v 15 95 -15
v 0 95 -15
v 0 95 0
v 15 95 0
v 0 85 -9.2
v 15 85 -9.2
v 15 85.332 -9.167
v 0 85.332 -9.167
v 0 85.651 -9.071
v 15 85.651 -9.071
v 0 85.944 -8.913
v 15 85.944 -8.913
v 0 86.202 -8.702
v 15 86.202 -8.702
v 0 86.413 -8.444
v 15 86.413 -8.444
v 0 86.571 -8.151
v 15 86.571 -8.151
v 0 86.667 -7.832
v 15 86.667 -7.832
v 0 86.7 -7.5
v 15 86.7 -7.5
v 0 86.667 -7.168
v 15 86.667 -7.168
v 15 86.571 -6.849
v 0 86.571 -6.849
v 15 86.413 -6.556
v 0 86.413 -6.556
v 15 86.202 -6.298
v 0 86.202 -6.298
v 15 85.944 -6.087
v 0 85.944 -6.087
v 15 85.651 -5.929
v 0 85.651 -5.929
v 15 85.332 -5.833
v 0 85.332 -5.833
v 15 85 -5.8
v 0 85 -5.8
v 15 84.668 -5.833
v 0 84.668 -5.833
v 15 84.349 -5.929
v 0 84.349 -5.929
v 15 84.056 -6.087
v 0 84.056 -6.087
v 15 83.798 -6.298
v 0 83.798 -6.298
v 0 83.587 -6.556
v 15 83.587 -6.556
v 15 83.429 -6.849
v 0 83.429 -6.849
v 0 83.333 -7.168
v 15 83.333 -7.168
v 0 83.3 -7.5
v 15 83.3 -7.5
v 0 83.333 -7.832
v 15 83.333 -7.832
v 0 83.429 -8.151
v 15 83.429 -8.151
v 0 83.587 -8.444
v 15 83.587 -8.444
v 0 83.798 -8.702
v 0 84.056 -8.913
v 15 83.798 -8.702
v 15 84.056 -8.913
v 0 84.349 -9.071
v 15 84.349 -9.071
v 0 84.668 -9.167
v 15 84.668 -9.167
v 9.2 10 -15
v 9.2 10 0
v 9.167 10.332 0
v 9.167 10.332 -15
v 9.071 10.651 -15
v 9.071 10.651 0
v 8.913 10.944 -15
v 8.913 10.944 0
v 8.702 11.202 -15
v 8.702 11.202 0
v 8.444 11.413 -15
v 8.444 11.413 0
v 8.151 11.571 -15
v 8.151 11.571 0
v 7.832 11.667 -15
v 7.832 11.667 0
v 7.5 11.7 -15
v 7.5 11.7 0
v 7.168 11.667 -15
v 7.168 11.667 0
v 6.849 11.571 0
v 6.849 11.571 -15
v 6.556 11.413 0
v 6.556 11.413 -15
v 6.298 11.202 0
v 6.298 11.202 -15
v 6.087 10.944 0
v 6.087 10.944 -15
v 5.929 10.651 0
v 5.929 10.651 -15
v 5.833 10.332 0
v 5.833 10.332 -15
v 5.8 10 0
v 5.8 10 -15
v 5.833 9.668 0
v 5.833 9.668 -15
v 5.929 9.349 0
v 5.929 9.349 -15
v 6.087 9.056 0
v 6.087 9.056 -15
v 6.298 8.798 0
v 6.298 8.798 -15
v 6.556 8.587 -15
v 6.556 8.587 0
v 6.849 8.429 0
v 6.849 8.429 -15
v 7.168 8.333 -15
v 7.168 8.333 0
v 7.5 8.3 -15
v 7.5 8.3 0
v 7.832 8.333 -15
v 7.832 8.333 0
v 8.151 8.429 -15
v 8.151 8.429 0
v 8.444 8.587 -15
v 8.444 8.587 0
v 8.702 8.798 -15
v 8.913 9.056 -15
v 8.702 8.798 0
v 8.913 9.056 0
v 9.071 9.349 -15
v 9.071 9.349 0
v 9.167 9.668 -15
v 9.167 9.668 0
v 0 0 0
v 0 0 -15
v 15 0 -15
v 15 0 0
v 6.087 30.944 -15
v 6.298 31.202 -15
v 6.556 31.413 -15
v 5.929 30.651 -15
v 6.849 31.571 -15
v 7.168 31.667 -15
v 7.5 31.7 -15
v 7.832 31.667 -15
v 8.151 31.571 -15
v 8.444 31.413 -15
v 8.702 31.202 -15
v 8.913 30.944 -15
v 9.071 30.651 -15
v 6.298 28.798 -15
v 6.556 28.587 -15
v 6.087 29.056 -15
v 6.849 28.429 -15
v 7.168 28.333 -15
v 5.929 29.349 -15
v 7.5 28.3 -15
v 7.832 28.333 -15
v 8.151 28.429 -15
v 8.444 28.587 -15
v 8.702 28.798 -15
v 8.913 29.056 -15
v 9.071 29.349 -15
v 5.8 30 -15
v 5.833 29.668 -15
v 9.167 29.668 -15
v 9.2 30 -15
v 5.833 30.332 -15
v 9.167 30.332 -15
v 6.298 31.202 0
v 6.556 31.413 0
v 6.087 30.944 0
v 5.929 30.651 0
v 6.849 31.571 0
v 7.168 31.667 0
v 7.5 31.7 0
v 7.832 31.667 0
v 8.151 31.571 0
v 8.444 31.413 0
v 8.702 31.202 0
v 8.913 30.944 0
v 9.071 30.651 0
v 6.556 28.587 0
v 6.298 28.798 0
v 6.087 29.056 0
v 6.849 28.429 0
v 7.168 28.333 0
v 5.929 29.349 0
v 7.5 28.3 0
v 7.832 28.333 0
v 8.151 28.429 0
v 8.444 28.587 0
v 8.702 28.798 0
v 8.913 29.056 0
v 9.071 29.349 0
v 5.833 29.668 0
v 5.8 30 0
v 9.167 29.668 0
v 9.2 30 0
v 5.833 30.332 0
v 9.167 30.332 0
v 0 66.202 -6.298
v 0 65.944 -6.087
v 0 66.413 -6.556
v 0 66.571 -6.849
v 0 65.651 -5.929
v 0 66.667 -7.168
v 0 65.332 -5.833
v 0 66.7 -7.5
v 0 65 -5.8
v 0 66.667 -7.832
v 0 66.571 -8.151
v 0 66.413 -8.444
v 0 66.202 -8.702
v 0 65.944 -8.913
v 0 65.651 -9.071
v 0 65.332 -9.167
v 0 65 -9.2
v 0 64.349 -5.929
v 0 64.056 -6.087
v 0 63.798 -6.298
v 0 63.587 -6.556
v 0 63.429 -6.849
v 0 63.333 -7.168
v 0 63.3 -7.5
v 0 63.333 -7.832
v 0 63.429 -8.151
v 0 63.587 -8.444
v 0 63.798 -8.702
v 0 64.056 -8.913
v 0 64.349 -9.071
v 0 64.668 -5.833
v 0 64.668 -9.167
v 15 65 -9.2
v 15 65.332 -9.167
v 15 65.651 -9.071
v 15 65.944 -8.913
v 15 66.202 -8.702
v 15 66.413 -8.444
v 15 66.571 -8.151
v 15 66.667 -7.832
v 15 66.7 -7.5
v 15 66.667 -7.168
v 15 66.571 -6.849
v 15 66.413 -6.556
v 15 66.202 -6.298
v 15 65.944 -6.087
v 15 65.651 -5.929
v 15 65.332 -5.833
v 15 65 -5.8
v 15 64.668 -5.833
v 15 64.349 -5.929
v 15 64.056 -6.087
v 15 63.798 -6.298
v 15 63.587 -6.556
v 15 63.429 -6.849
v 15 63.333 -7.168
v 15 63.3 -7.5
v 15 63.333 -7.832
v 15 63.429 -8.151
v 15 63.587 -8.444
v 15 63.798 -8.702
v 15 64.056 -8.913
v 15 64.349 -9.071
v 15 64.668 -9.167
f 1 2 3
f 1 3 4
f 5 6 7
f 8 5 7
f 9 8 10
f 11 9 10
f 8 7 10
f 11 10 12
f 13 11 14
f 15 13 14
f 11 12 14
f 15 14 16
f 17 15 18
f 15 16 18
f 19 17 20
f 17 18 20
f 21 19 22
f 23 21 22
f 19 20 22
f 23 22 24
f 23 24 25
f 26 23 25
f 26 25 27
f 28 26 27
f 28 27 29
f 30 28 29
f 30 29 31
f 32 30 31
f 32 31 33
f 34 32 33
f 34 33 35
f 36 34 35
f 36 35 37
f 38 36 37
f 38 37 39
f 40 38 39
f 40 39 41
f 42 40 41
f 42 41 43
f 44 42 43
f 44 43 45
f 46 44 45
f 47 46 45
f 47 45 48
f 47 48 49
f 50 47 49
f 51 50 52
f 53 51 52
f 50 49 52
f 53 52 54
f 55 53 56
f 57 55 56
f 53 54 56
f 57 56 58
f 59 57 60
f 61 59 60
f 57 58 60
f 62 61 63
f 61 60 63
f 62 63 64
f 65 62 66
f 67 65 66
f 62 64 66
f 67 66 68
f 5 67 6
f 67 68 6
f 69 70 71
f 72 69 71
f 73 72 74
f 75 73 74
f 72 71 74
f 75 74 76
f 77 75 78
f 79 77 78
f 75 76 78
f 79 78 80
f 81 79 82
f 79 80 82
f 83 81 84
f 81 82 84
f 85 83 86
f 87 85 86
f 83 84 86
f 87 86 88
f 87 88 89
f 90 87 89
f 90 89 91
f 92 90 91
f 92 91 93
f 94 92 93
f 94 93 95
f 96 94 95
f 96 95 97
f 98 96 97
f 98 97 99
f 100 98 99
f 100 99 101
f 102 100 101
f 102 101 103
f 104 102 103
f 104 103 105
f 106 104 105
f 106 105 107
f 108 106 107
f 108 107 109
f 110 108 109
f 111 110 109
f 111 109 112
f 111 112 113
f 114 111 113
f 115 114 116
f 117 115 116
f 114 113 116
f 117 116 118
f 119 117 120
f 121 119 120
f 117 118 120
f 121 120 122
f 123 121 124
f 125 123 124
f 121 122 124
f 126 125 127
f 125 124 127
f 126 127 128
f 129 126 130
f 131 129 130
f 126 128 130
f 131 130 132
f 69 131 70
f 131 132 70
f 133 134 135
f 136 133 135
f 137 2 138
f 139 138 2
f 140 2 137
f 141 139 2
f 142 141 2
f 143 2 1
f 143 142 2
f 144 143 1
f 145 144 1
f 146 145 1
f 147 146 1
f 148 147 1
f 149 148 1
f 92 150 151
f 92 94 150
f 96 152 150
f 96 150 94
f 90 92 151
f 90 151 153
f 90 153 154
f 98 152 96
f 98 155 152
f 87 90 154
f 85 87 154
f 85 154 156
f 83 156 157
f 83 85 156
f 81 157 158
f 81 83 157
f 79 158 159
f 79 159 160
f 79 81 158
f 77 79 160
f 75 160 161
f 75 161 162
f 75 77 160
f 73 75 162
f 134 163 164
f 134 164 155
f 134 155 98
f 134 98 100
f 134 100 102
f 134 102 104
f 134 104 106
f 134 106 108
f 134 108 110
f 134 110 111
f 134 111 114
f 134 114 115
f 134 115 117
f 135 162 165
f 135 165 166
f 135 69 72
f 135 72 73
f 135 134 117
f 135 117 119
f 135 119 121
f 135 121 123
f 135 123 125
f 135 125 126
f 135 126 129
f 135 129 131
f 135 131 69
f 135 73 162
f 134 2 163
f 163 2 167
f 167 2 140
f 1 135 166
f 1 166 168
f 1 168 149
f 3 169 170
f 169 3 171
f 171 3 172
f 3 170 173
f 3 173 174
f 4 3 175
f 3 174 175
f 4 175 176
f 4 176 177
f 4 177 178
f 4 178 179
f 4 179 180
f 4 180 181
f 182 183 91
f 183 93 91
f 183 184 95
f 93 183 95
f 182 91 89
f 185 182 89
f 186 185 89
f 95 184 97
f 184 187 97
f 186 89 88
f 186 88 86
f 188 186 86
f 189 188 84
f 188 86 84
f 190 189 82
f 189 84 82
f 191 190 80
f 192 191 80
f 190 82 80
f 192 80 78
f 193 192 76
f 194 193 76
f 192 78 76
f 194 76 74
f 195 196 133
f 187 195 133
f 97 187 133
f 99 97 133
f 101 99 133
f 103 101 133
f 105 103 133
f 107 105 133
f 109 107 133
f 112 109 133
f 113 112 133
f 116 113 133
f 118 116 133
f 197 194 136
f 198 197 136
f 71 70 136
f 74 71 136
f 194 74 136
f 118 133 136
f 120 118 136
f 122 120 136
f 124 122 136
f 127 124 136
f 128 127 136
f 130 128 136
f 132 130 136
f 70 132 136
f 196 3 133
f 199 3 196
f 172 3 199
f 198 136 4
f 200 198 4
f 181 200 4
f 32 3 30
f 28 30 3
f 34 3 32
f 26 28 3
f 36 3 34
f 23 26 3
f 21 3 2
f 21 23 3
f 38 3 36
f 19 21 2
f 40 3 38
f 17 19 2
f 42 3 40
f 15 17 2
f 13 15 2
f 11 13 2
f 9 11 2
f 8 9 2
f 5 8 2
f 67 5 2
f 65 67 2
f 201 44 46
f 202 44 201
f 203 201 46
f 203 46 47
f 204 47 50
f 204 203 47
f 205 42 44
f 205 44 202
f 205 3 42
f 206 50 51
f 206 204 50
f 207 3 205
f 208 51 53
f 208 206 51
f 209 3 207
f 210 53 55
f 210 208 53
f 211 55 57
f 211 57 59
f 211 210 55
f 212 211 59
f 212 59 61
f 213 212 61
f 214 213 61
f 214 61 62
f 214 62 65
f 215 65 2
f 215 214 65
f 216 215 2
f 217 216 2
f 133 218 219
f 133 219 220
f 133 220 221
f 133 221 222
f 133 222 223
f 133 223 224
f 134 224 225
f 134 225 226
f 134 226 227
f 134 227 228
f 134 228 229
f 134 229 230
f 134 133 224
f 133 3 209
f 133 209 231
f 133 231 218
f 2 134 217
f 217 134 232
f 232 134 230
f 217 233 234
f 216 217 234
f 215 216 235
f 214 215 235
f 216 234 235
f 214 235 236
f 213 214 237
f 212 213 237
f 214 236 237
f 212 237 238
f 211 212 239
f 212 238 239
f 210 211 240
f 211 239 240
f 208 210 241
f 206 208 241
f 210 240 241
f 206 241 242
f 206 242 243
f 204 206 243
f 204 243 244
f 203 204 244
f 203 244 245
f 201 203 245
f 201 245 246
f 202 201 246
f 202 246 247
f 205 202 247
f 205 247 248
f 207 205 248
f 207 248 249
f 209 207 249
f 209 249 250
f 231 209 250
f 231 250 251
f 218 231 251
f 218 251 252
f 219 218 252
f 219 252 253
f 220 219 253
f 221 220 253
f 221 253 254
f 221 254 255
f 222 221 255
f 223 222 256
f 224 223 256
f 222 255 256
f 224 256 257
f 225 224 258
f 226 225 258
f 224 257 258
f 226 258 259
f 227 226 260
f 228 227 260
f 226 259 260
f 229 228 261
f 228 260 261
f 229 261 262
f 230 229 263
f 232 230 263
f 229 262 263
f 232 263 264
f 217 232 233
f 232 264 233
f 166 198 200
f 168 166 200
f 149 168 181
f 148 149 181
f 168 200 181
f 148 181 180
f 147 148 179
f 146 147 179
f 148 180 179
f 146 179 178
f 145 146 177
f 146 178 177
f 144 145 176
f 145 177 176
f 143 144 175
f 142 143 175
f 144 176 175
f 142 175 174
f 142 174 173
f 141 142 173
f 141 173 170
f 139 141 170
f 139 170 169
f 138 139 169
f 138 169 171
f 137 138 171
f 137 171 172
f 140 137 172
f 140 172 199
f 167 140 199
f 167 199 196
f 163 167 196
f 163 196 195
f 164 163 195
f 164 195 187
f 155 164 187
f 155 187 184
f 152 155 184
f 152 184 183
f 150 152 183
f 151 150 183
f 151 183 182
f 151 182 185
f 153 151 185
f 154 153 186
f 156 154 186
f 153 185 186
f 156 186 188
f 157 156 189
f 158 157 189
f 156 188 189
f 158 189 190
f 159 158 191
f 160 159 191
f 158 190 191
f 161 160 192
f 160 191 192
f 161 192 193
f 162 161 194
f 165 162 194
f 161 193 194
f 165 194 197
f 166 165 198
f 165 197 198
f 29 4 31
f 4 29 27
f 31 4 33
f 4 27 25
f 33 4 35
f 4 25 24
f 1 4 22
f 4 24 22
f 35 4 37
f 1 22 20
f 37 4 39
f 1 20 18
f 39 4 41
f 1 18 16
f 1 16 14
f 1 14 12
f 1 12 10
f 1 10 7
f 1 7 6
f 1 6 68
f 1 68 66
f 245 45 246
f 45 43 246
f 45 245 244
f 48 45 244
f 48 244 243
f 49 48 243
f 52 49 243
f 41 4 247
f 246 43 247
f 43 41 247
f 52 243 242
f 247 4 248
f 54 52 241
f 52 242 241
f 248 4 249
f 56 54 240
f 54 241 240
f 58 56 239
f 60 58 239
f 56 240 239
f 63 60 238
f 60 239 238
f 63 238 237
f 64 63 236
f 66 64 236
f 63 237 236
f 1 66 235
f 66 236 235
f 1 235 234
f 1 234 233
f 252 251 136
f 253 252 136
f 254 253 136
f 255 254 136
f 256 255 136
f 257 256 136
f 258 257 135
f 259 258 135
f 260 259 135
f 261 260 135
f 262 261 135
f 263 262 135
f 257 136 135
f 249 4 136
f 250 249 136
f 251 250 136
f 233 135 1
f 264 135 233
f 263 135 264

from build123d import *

# Parameters (mm, degrees)
SKETCH_1_W          = 15
SKETCH_1_H          = 15
EXTRUDE_1_DEPTH     = 95
SKETCH_2_R          = 1.7
CUT_EXTRUDE_1_DEPTH = 98.33961167
SKETCH_3_R          = 1.7
CUT_EXTRUDE_2_DEPTH = 98.33961167


with BuildPart() as part:
    # 草图1 → 凸台-拉伸1 (new body)
    with BuildSketch(Plane(origin=(0, 0, 0), x_dir=(1, 0, 0), z_dir=(0, 1, 0))):
        with Locations((7.5, 7.5)):
            Rectangle(SKETCH_1_W, SKETCH_1_H)
    extrude(amount=EXTRUDE_1_DEPTH)

    # 草图2 → 切除-拉伸1 (cut, through all)
    with BuildSketch(Plane.XY):
        with Locations((7.5, 10)):
            Circle(SKETCH_2_R)
        with Locations((7.5, 30)):
            Circle(SKETCH_2_R)
    extrude(amount=-CUT_EXTRUDE_1_DEPTH, mode=Mode.SUBTRACT)

    # 草图3 → 切除-拉伸2 (cut, through all)
    with BuildSketch(Plane(origin=(15, 0, 0), x_dir=(0, 0, -1), z_dir=(1, 0, 0))):
        with Locations((7.5, 85)):
            Circle(SKETCH_3_R)
        with Locations((7.5, 65)):
            Circle(SKETCH_3_R)
    extrude(amount=-CUT_EXTRUDE_2_DEPTH, mode=Mode.SUBTRACT)


solid = part.part
